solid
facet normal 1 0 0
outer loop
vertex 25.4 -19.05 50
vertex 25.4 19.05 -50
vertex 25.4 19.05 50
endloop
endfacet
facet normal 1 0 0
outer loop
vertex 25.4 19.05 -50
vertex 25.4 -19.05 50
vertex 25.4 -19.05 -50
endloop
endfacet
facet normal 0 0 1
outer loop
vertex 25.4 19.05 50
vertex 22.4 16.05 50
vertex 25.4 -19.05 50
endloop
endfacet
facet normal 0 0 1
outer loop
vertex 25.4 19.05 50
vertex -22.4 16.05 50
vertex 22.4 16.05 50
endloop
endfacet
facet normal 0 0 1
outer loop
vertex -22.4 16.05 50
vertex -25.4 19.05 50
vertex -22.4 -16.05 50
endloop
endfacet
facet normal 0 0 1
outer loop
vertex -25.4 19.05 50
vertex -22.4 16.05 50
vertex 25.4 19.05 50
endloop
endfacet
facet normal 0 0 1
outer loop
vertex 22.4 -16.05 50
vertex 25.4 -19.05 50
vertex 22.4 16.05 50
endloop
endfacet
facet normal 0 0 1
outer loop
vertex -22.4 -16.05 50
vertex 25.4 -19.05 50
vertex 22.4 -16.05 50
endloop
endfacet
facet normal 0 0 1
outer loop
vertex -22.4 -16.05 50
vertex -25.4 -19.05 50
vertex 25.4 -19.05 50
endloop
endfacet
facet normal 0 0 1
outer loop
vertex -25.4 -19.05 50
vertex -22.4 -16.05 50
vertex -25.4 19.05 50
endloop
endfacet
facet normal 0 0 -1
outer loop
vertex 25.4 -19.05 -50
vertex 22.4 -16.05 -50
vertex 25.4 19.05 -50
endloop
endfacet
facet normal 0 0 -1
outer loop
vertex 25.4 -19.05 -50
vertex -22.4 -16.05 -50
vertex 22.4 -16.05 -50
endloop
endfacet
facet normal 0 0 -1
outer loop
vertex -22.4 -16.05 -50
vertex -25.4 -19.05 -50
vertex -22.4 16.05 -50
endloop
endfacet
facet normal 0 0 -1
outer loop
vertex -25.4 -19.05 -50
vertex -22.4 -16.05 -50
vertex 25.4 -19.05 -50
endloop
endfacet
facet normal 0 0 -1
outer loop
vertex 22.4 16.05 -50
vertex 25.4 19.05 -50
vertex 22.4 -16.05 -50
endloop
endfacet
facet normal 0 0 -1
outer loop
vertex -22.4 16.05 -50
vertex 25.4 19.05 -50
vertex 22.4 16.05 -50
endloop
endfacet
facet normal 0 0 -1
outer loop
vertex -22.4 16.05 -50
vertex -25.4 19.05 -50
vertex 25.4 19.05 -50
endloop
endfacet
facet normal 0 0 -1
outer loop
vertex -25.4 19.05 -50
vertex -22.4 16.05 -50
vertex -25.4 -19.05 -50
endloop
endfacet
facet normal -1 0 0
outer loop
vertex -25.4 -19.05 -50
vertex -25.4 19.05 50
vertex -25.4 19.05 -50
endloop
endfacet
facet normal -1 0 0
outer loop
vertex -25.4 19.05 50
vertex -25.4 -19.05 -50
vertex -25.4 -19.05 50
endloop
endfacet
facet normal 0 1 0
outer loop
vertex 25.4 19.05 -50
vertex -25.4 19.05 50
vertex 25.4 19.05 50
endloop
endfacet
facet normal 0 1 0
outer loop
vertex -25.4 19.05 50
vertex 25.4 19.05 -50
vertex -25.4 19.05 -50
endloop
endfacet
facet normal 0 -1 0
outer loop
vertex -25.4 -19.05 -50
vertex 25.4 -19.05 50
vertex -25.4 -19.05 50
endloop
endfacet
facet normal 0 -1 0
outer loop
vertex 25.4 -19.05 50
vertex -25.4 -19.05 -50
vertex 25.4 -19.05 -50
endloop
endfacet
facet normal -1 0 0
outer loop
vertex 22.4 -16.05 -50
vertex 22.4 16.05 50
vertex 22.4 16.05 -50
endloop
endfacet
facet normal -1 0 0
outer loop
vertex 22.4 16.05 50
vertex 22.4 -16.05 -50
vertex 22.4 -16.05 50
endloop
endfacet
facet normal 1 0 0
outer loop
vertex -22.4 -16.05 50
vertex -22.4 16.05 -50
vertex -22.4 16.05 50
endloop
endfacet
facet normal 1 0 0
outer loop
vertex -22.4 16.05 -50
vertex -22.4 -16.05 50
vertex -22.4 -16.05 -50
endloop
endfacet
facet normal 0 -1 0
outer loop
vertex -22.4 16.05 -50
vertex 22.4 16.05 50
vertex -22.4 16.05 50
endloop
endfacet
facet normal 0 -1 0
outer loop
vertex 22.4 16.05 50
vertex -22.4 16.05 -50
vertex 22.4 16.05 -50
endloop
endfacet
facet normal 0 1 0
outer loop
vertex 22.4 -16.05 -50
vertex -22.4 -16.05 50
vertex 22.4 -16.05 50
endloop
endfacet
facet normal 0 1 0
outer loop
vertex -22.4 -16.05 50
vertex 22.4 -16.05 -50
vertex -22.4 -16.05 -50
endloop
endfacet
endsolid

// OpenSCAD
$fn = 64;

// Aluminium rectangular box section: 50.8mm x 38.1mm x 3.0mm wall
outer_w = 50.8;   // X (mm)
outer_h = 38.1;   // Y (mm)
wall    = 3.0;    // wall thickness (mm)
length  = 100;    // Z (mm)

inner_w = outer_w - 2*wall;
inner_h = outer_h - 2*wall;

eps = 0.05;       // small overlap to guarantee clean boolean

// One connected solid: open-ended rectangular tube
difference() {
    cube([outer_w, outer_h, length], center=true);

    // Inner void: extend slightly beyond both ends so the tube is clearly hollow in top/bottom views
    cube([inner_w, inner_h, length + 2*eps], center=true);
}
